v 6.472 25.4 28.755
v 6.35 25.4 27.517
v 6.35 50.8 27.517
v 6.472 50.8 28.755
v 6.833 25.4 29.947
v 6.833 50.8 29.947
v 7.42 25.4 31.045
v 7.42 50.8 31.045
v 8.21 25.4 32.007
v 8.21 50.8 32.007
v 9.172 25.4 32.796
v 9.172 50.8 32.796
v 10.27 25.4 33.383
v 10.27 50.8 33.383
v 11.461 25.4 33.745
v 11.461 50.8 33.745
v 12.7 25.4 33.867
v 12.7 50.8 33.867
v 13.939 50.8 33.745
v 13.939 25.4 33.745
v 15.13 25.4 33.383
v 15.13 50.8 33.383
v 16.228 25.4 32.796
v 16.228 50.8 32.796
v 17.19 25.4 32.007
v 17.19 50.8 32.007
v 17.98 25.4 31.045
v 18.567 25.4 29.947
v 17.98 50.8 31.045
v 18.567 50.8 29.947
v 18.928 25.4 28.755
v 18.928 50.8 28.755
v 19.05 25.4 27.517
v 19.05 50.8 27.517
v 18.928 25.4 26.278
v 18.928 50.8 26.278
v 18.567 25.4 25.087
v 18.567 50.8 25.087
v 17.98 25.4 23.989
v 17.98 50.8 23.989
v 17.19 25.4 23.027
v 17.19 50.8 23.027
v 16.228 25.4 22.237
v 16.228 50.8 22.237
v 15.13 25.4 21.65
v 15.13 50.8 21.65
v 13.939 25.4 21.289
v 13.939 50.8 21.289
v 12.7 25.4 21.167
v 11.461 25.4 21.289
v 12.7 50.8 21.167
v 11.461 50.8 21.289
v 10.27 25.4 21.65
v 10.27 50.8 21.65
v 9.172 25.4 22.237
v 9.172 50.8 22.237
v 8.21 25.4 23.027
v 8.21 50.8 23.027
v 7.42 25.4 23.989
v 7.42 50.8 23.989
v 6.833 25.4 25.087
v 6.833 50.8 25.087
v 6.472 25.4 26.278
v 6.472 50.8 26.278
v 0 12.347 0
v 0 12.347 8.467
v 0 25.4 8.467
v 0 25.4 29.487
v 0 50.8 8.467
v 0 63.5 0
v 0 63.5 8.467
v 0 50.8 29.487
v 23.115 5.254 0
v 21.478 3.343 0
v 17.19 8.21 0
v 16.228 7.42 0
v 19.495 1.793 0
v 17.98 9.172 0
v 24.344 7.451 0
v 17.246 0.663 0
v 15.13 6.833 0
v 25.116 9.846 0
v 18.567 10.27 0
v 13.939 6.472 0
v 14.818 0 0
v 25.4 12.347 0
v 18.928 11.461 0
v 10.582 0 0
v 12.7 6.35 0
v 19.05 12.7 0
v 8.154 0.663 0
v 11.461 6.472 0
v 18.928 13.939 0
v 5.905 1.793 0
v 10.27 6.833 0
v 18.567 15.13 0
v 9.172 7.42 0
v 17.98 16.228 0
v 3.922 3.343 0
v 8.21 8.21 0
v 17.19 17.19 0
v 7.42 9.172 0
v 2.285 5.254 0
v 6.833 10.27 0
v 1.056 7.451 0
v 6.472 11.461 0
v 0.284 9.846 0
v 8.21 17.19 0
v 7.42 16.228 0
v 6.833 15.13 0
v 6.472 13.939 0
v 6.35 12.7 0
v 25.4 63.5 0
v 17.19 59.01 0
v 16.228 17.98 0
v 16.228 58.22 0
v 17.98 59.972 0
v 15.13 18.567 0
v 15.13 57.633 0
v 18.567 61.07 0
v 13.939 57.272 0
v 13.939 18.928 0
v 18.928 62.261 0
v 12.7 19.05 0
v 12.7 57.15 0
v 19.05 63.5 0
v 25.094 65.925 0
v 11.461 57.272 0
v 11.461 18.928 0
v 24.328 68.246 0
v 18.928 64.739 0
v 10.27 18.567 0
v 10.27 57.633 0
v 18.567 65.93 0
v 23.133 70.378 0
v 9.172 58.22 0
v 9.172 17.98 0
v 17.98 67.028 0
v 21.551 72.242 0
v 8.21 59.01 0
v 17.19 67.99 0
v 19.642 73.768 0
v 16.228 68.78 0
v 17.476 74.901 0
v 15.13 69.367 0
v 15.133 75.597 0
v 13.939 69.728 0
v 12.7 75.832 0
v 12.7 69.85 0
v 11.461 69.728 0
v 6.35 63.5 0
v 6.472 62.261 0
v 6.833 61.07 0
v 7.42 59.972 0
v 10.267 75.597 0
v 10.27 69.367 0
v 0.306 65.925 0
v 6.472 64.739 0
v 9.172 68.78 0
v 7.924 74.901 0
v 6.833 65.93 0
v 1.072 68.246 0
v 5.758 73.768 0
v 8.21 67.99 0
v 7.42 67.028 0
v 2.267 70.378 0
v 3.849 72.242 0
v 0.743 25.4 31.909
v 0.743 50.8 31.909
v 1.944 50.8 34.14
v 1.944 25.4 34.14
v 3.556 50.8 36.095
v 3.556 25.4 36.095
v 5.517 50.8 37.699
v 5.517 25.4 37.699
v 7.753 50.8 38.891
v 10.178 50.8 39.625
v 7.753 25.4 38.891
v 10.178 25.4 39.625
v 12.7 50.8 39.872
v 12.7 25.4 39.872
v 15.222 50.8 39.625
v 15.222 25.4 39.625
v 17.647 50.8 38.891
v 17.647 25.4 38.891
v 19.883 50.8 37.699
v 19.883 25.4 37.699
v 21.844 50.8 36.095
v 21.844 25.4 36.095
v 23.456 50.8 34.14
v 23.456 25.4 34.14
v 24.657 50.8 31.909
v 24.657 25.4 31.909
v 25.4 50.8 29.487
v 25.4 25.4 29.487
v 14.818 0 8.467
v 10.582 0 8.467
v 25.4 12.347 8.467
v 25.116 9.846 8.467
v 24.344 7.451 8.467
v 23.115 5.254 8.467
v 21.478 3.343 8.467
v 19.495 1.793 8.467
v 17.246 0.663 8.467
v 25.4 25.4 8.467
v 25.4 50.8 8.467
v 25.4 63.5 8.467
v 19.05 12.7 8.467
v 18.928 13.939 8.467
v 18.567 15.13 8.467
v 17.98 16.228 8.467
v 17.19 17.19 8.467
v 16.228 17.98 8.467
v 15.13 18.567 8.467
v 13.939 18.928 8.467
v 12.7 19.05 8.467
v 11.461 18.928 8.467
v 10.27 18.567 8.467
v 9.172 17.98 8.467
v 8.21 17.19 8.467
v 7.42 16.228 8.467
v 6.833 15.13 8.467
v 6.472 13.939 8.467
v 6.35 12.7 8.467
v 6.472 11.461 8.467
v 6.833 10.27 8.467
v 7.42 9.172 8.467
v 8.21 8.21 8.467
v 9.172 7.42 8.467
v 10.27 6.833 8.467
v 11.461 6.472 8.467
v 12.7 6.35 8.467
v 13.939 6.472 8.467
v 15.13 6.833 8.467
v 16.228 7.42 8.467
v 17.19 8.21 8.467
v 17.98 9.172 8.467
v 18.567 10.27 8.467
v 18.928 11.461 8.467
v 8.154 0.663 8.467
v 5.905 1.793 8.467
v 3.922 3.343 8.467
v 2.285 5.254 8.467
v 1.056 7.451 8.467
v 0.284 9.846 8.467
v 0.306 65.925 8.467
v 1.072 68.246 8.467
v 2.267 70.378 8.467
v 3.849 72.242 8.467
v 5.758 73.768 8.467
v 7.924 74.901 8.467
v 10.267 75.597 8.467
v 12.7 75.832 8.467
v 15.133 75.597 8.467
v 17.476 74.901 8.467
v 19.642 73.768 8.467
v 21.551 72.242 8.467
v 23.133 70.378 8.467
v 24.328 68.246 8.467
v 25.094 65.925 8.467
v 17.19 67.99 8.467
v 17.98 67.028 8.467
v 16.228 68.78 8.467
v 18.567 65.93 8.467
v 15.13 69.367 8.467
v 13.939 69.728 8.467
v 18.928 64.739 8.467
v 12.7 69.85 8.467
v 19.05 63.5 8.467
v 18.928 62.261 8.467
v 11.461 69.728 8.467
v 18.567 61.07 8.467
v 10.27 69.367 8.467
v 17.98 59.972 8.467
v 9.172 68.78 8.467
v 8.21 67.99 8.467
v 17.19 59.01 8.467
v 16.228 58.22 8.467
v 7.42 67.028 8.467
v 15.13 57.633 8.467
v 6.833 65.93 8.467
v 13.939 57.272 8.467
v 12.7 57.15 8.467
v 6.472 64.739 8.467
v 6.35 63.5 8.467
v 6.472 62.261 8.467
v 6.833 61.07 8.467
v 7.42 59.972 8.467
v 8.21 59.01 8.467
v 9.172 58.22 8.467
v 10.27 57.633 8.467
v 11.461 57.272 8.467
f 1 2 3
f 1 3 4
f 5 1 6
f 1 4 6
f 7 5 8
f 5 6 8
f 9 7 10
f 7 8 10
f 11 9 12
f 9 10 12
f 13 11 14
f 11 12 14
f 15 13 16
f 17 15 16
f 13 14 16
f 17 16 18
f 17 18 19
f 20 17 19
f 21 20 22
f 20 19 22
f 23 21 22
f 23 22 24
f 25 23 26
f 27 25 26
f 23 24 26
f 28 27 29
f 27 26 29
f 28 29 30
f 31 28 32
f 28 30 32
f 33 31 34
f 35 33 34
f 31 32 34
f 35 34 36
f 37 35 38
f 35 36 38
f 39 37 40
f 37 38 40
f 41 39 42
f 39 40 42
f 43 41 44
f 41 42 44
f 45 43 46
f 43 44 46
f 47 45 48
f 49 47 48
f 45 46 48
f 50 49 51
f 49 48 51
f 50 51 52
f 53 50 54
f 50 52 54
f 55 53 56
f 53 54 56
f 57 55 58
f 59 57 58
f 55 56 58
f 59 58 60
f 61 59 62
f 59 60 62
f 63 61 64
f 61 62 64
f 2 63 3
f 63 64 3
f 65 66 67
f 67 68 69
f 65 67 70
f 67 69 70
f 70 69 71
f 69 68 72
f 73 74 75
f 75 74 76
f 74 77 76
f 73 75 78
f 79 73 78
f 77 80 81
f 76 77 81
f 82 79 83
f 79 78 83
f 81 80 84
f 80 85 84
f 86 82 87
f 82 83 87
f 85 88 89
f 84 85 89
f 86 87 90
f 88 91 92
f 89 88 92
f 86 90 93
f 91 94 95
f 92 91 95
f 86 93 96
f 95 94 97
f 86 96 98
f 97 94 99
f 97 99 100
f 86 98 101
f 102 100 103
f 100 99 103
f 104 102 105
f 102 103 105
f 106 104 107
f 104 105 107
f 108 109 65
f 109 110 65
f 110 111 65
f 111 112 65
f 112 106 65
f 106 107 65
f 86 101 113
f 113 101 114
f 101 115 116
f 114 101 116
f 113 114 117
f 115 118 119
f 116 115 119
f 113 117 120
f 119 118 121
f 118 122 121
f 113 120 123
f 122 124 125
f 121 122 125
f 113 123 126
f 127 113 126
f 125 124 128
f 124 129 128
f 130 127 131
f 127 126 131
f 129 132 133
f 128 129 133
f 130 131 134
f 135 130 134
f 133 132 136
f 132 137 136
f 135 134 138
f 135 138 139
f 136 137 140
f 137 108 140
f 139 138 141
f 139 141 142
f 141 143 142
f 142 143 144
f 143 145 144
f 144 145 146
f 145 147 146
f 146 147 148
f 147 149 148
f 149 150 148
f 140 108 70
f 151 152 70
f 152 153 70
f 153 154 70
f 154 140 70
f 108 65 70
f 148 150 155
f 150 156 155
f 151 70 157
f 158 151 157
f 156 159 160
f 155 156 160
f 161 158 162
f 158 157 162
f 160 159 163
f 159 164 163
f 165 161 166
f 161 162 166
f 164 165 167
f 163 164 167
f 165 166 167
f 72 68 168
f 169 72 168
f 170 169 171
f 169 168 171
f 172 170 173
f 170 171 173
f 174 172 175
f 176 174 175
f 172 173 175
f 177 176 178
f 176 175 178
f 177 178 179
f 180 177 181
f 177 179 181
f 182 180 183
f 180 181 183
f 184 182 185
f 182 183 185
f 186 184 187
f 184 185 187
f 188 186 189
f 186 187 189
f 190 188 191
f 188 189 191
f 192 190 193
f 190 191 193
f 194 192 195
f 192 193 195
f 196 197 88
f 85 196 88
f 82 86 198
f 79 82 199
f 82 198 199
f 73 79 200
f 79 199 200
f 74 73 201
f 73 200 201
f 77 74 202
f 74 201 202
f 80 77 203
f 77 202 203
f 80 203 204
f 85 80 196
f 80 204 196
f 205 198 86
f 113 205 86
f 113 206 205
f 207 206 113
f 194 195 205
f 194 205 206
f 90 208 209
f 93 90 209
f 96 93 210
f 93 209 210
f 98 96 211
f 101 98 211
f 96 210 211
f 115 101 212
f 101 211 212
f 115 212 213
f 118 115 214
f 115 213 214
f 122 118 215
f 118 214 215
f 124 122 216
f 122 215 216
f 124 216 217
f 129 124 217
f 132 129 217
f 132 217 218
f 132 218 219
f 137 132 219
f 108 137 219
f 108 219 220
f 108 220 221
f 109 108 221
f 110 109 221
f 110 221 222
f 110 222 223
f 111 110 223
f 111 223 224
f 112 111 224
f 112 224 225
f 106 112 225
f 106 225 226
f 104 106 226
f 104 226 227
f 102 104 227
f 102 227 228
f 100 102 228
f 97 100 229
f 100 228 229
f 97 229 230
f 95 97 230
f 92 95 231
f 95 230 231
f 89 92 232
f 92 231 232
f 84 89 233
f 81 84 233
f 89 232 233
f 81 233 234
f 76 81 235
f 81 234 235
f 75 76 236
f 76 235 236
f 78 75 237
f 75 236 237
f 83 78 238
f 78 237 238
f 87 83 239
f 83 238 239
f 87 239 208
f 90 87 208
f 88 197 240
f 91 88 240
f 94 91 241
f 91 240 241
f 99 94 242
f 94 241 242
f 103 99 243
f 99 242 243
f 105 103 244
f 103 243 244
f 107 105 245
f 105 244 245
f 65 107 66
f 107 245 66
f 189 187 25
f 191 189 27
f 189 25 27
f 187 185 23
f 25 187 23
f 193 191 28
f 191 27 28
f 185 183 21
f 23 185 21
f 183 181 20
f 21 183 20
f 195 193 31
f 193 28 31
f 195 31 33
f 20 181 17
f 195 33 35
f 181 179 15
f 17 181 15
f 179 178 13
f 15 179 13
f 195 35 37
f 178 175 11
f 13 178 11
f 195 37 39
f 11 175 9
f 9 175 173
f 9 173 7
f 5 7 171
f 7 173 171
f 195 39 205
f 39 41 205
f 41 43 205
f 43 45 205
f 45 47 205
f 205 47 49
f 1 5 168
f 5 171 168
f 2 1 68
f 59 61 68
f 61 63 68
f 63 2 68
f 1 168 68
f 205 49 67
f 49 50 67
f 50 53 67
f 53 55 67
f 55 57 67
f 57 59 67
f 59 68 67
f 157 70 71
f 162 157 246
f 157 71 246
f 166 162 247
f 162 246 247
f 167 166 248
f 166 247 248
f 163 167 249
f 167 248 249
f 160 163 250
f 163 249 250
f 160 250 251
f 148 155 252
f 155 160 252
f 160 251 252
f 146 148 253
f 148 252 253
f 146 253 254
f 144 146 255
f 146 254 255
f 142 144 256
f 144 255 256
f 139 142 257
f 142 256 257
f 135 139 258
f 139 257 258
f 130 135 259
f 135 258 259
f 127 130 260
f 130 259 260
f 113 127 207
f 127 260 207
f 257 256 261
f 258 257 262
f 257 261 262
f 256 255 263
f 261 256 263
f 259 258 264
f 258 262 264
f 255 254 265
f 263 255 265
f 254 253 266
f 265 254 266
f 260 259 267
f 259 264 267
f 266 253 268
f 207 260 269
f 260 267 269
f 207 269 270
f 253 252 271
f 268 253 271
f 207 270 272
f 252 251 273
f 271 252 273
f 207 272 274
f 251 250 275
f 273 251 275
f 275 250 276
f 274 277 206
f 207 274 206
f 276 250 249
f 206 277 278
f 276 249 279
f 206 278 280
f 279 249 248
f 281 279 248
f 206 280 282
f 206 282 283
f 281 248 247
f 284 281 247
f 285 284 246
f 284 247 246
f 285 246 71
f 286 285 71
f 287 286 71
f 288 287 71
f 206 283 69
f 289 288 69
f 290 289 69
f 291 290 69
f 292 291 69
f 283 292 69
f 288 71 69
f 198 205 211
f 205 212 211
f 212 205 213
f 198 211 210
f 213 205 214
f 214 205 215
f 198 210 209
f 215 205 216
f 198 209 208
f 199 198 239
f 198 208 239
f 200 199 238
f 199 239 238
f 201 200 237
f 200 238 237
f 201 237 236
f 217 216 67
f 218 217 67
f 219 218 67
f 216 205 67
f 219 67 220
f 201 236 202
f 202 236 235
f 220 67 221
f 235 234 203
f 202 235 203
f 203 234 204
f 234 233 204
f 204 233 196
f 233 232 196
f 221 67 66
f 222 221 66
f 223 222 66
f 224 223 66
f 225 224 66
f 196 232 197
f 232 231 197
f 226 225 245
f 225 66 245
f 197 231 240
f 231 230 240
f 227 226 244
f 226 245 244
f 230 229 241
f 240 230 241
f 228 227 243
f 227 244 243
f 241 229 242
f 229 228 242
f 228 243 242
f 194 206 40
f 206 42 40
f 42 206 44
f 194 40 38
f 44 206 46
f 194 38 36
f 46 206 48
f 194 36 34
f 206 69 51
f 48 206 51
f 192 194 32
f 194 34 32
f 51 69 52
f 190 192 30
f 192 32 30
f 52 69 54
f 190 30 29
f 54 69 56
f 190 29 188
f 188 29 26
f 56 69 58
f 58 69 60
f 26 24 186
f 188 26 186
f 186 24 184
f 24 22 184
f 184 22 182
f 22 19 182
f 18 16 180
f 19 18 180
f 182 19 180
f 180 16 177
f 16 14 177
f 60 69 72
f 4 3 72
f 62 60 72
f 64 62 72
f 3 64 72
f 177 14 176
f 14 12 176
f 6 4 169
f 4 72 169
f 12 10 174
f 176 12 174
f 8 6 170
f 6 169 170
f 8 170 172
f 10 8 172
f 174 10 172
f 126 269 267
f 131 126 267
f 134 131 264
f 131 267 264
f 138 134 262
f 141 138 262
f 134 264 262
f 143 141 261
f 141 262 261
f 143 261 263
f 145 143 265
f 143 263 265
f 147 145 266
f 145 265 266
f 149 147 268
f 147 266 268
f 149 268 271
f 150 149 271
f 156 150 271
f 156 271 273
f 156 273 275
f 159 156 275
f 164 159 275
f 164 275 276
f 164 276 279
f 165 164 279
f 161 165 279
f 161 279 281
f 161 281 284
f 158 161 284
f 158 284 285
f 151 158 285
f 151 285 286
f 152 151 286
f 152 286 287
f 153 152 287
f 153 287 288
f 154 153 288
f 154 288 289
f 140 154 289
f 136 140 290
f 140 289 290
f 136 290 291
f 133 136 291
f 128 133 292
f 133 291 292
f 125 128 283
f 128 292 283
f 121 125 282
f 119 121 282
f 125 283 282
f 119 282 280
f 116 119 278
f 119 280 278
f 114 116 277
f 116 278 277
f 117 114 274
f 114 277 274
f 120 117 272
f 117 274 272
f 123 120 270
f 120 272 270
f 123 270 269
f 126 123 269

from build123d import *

# Parameters (mm, degrees)
F1_DEPTH  = 25.4
F2_R      = 6.35
F3_DEPTH  = 25.4
F4_R      = 6.35
F5_DEPTH  = 25.4
F7_DEPTH  = 25.4
F9_DEPTH  = 25.4
F11_DEPTH = 25.4


with BuildPart() as f1:
    # F0 (on Right) → F1 (new body)
    with BuildSketch(Plane.YZ):
        Polygon((0, 8.4666666667), (0, 0), (76.2, 0), (76.2, 8.4666666667), (50.8, 8.4666666667), (50.8, 40.2166666667), (25.4, 40.2166666667), (25.4, 8.4666666667), align=None)
    extrude(amount=F1_DEPTH)

    # F2 (on face) → F3 (cut)
    with BuildSketch(Plane(origin=(0, 50.8, 0), x_dir=(-1, 0, 0), z_dir=(0, 1, 0))):
        with Locations((-12.7, 27.5166666667)):
            Circle(F2_R)
    extrude(amount=-F3_DEPTH, mode=Mode.SUBTRACT)

    # F4 (on face) → F5 (cut)
    with BuildSketch(Plane.XY.offset(8.4666666667)):
        with Locations((12.7, 63.5)):
            Circle(F4_R)
        with Locations((12.7, 12.7)):
            Circle(F4_R)
    extrude(amount=-F5_DEPTH, mode=Mode.SUBTRACT)

    # F6 (on face) → F7 (cut)
    with BuildSketch(Plane.XY.offset(8.4666666667)):
        with BuildLine():
            ThreePointArc((0, 63.5), (12.7, 75.8324942144), (25.4, 63.5))
            Line((25.4, 63.5), (25.4, 76.2))
            Line((25.4, 76.2), (0, 76.2))
            Line((0, 76.2), (0, 63.5))
        make_face()
    extrude(amount=-F7_DEPTH, mode=Mode.SUBTRACT)

    # F8 (on face) → F9 (cut)
    with BuildSketch(Plane.XY.offset(8.4666666667)):
        with BuildLine():
            ThreePointArc((10.5819482078, 0), (3.0561269403, 4.2579759584), (0, 12.3467603626))
            Line((0, 12.3467603626), (0, 0))
            Line((0, 0), (10.5819482078, 0))
        make_face()
        with BuildLine():
            ThreePointArc((25.4, 12.3467603626), (22.3438730597, 4.2579759584), (14.8180517922, 0))
            Line((14.8180517922, 0), (25.4, 0))
            Line((25.4, 0), (25.4, 12.3467603626))
        make_face()
    extrude(amount=-F9_DEPTH, mode=Mode.SUBTRACT)

    # F10 (on face) → F11 (cut)
    with BuildSketch(Plane.XZ.offset(-25.4)):
        with BuildLine():
            ThreePointArc((0, 29.4869819596), (12.7, 39.8722781395), (25.4, 29.4869819596))
            Line((25.4, 29.4869819596), (25.4, 40.2166666667))
            Line((25.4, 40.2166666667), (0, 40.2166666667))
            Line((0, 40.2166666667), (0, 29.4869819596))
        make_face()
    extrude(amount=-F11_DEPTH, mode=Mode.SUBTRACT)


solid = f1.part
